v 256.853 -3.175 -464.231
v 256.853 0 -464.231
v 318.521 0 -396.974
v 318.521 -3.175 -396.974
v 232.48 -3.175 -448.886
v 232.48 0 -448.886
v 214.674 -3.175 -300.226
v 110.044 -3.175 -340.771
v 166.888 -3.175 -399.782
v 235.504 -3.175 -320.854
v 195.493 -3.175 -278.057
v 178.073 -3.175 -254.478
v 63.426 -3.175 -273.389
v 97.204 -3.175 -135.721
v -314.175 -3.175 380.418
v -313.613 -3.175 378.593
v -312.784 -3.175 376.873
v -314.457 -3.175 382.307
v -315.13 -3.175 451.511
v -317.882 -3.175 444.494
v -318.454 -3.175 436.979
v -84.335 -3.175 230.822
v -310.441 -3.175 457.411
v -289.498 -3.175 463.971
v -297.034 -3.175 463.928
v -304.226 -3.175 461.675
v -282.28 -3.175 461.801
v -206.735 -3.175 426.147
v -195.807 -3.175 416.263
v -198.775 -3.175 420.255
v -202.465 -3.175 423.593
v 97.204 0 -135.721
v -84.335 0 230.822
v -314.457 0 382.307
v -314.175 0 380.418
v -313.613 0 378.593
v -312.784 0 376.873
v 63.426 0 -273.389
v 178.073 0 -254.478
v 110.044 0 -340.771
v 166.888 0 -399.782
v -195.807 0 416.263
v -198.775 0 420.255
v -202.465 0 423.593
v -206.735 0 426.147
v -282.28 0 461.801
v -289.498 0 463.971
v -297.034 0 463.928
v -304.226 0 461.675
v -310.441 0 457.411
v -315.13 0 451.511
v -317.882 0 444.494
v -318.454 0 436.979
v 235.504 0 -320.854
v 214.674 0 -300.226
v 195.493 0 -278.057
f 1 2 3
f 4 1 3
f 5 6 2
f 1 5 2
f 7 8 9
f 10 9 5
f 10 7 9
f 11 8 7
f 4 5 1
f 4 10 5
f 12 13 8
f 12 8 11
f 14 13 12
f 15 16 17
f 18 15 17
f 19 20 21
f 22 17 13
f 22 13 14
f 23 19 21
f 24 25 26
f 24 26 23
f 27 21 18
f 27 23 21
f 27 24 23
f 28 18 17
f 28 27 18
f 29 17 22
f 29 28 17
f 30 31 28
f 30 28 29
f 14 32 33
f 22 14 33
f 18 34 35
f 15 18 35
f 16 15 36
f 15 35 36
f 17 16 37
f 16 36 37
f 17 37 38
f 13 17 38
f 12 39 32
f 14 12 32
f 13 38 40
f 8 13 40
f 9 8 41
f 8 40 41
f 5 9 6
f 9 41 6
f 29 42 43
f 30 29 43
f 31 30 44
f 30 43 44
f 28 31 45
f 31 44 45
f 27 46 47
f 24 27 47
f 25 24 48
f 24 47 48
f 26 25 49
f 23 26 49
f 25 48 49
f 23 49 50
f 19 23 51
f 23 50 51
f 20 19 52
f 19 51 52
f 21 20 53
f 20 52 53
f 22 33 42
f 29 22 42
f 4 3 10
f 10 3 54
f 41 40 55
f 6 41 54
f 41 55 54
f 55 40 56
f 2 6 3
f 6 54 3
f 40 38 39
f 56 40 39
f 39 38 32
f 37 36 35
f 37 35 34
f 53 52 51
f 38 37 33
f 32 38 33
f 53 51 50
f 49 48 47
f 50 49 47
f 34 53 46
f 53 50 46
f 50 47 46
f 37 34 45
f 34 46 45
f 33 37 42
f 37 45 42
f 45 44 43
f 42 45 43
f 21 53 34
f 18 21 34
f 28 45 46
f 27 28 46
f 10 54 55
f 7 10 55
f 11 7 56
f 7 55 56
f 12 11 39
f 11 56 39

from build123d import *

# Parameters (mm, degrees)
F1_DEPTH = 3.175


# Not quite as in the source:
# - ends of sketch curves that miss each other by under 0.0002 mm in the source are joined


with BuildPart() as f1:
    # F0 (on Front) → F1 (new body)
    with BuildSketch(Plane.XZ):
        with BuildLine():
            Line((256.8526232, -464.2309994), (318.5212324, -396.9739076))
            Line((318.5212324, -396.9739076), (235.5036438, -320.8543748))
            ThreePointArc((235.5036438, -320.8543748), (204.8703266123, -289.3256959733), (178.0726202767, -254.4783059859))
            Line((178.0726202767, -254.4783059859), (97.204276, -135.7211662))
            Line((97.204276, -135.7211662), (-84.3345278, 230.8220174))
            Line((-84.3345278, 230.8220174), (-195.8067712, 416.2626422))
            ThreePointArc((-195.8067712, 416.2626422), (-200.5384813212, 422.0145789545), (-206.7351977857, 426.1467211829))
            Line((-206.7351977857, 426.1467211829), (-282.2801314, 461.8011846))
            ThreePointArc((-282.2801314, 461.8011846), (-307.4924345817, 459.774434742), (-318.4536458896, 436.9792648454))
            Line((-318.4536458896, 436.9792648454), (-314.4572832, 382.307084))
            ThreePointArc((-314.4572832, 382.307084), (-313.9285810002, 379.4952234768), (-312.7838670978, 376.873066496))
            Line((-312.7838670978, 376.873066496), (63.4258828, -273.3887852))
            ThreePointArc((63.4258828, -273.3887852), (137.2742586369, -371.4240291313), (232.4799240247, -448.8861008552))
            Line((232.4799240247, -448.8861008552), (256.8526232, -464.2309994))
        make_face()
    extrude(amount=F1_DEPTH)


solid = f1.part
